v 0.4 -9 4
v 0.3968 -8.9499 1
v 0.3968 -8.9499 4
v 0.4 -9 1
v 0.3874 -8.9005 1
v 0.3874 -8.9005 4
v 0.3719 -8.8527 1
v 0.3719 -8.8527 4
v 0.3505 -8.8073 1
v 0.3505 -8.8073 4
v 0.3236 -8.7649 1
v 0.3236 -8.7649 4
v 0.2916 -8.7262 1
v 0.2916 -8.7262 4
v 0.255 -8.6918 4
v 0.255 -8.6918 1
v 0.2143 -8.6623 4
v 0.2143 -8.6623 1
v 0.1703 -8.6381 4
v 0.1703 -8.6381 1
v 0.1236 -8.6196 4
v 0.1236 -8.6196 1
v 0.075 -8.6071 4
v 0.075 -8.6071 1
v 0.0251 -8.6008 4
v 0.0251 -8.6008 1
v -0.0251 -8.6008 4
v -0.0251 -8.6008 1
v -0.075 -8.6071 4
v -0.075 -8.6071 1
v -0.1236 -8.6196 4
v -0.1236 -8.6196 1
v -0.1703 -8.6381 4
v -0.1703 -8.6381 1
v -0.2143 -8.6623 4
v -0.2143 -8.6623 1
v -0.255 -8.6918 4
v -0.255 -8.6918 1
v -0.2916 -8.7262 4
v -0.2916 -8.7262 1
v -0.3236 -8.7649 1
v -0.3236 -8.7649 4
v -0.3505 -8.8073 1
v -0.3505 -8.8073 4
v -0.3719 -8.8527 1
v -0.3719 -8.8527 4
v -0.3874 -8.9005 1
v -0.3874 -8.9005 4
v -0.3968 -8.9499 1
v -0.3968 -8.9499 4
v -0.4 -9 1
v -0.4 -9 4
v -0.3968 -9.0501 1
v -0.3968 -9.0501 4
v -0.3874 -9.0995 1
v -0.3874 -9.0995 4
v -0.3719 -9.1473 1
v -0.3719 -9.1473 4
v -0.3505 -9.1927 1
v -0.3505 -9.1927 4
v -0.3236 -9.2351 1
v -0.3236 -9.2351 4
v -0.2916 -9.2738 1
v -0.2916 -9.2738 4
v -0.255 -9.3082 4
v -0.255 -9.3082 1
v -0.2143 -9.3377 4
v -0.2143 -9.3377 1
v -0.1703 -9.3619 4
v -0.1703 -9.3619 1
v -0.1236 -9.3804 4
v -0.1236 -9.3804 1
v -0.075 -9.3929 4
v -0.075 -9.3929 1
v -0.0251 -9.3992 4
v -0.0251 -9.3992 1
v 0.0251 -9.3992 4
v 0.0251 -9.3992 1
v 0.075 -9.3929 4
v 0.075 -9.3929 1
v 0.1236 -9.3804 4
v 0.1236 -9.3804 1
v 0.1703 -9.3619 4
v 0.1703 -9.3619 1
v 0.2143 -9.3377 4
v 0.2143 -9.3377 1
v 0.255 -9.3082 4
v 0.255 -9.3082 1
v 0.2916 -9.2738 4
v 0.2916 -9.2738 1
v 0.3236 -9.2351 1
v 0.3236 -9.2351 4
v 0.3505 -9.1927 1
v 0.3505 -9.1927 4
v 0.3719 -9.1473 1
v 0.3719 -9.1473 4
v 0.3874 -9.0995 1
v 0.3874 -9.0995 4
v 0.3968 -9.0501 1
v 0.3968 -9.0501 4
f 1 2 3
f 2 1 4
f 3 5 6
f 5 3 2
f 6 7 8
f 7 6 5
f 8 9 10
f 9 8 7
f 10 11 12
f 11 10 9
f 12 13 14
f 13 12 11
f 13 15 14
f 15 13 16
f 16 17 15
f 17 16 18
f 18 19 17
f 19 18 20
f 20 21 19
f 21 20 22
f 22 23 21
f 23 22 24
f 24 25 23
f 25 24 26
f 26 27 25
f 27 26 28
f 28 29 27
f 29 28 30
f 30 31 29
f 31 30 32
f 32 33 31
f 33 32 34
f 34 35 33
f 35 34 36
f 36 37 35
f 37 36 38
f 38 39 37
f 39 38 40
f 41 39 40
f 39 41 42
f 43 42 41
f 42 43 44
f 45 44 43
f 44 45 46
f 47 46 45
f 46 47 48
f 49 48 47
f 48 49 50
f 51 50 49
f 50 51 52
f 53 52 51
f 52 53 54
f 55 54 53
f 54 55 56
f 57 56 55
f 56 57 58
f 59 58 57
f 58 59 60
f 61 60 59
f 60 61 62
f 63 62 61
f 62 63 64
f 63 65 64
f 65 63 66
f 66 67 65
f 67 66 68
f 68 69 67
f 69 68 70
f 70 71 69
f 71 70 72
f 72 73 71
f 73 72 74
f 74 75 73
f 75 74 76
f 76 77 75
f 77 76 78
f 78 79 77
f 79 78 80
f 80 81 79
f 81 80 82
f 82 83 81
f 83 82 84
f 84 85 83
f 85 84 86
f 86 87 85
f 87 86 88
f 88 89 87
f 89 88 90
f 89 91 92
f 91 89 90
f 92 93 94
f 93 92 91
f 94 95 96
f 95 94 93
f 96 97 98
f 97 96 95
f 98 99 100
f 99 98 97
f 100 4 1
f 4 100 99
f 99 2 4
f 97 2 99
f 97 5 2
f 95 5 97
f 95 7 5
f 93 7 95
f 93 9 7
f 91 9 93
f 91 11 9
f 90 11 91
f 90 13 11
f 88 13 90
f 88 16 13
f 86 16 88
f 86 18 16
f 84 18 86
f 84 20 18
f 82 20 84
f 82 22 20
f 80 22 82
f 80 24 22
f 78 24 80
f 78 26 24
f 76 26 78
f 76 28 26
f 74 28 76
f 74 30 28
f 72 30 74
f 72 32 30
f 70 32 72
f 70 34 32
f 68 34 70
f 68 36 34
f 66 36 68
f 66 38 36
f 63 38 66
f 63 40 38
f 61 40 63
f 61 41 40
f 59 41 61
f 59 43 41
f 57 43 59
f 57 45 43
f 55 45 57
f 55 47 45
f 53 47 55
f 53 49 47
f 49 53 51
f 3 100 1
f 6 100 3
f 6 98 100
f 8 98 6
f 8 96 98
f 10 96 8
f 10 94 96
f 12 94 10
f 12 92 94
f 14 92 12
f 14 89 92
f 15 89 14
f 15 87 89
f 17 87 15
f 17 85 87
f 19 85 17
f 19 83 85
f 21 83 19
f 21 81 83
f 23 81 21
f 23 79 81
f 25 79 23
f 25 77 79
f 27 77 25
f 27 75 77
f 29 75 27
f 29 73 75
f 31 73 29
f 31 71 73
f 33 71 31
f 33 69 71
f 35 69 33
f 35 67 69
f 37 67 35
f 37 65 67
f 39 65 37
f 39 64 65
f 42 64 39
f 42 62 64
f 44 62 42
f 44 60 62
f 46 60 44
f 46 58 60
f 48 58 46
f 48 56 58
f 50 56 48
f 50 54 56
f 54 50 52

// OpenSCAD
translate([0,0,0])
	linear_extrude(height=0.8, center=true)
    	import("../dxf/steamengine_wheel_big.dxf", $fn=50);
translate([0,0,-0.2])
	linear_extrude(height=0.4, center=true)
    	import("../dxf/steamengine_wheel_big_int.dxf", $fn=50);
translate([0,0,0.8])
	linear_extrude(height=1, center=true)
    	import("../dxf/steamengine_wheel_big_ext.dxf", $fn=50);
translate([0,-9,1])
	cylinder(3,0.4, 0.4, $fn=50);
